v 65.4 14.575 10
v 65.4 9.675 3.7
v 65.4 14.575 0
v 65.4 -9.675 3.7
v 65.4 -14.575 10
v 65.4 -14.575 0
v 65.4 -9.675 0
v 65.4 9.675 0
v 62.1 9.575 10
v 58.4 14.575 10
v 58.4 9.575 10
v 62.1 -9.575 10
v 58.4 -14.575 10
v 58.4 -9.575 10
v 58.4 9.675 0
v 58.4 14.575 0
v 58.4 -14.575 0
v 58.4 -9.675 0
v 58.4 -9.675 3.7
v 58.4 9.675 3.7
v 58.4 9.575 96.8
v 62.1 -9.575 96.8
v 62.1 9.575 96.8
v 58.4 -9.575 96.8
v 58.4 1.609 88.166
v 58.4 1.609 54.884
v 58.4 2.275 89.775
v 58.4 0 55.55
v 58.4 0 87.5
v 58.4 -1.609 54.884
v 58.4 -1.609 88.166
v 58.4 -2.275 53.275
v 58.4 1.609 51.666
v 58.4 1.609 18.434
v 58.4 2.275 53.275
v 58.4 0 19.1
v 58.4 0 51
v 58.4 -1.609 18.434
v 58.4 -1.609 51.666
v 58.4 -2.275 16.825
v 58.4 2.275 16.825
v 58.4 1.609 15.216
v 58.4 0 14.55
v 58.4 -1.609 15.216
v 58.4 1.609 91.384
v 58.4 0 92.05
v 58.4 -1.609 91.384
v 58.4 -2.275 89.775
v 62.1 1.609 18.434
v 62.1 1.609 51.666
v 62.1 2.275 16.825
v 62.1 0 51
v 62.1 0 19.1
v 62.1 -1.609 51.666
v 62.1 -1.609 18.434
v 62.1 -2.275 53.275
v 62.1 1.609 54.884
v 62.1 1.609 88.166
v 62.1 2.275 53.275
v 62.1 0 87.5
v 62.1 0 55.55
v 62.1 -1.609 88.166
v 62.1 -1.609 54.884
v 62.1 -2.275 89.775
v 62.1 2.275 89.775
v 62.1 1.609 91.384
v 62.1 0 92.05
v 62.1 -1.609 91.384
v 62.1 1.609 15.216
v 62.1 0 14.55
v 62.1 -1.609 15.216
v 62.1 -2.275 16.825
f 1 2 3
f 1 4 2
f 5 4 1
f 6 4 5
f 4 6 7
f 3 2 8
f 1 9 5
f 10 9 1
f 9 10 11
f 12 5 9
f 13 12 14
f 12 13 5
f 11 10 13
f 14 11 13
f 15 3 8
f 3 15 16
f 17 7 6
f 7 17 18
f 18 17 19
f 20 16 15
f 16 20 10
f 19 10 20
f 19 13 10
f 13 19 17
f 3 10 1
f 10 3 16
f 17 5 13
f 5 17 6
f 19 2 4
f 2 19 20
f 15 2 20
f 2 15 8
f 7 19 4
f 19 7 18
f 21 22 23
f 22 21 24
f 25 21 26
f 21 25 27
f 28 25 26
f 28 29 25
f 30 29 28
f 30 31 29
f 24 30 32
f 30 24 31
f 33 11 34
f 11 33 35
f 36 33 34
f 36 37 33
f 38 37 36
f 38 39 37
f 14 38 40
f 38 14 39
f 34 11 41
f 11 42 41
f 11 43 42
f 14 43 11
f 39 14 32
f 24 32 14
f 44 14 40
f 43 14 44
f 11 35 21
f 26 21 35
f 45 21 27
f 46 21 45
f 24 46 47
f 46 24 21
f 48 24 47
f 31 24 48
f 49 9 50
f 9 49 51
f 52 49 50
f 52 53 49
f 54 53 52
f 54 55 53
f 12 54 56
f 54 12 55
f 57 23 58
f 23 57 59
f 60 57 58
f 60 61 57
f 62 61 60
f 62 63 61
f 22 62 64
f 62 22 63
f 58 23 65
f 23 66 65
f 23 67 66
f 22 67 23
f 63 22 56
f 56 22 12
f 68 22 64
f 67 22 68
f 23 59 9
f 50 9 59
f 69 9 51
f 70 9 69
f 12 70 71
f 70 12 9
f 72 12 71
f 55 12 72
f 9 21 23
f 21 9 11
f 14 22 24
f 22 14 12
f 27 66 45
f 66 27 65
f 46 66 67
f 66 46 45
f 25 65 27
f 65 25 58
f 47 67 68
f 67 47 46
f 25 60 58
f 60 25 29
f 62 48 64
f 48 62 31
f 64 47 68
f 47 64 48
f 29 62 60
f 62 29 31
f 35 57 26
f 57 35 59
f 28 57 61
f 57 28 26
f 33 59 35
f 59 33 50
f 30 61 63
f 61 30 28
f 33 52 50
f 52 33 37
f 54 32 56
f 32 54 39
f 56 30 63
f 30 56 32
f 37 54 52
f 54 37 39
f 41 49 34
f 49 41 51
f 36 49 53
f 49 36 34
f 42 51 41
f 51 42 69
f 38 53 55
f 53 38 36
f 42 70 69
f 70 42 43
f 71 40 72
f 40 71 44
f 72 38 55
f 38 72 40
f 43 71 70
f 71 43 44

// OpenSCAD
// file: libs/triangles.scad
module rightAngleTriangle(side1, side2, height=0) {
    points = [[0, 0], [0, side1], [side2, 0]];
    
    if (height > 0) {
        linear_extrude(height)
            polygon(points);
    } else {
        polygon(points);
    }
}

module rightAngleTriangleByHypotenuse(hypotenuse, height=0) {
    sideLength = hypotenuse/sqrt(2);
    points = [[0, 0], [0, sideLength], [sideLength, 0]];
    
    if (height > 0) {
        linear_extrude(height)
            polygon(points);
    } else {
        polygon(points);
    }
}

module equilateralTriangleCentered(sideLength, height=0) {
    translate([sideLength/2, 0])
        equilateralTriangle(sideLength, height);
}

module equilateralTriangle(sideLength, height=0) {
    if (height > 0) {
        cylinder(height, sideLength, sideLength, $fn=3);
    } else {
        circle(sideLength, $fn=3);
    }
}

module diamond(sideLength, height=0) {
    rhombus(sideLength, sideLength, height);
}

module rhombus(longside, shortside, height=0) {
    rhomboid(longside, shortside, 60, height);
}

module rhomboid(longside, shortside, angle, height=0, center=false) {
    centerx = center ? -(longside + shortside*cos(angle))/2 : 0;
    centery = center ? -(shortside * sin(angle))/2 : 0;
    echo(centerx);
    echo(centery);
    
    points = [[0, 0], [longside, 0], [longside + shortside*cos(angle), shortside*sin(angle)], [shortside*cos(angle), shortside*sin(angle)]];

    translate([centerx, centery]) {
        if (height > 0) {
            linear_extrude(height)
                polygon(points);
        } else {
            polygon(points);
        }
    }
}
// main file
include <libs/triangles.scad>;

$fa=1;

bracketDepth = 1.85*2;
bracketlength = 99.8;
bracketWidth = 19.15;

OD = 110;
ID = 103.2; //.5
pipeThickness = (OD-ID)/2;

holeDiam = 4.55;
holeChamfer = 7.45;

module bracketArm() {  
    //holes
    // 7.75
    // 44.25
    // 80.7
    difference() {
        cube([bracketlength, bracketWidth, bracketDepth]);
        translate([bracketlength -(7.75 + holeDiam/2), bracketWidth/2]) {
            cylinder(bracketDepth, holeDiam/2, holeDiam/2);
            translate([0, 0, bracketDepth/2])
                cylinder(bracketDepth/2, holeChamfer/2, holeChamfer/2);
        }
        
        translate([bracketlength -(44.25 + holeDiam/2), bracketWidth/2]) {
            cylinder(bracketDepth, holeDiam/2, holeDiam/2);
            translate([0, 0, bracketDepth/2])
                cylinder(bracketDepth/2, holeChamfer/2, holeChamfer/2);
        }
        
        translate([bracketlength -(80.7 + holeDiam/2), bracketWidth/2]) {
            cylinder(bracketDepth, holeDiam/2, holeDiam/2);
            translate([0, 0, bracketDepth/2])
                cylinder(bracketDepth/2, holeChamfer/2, holeChamfer/2);
        }
    }
}

module bracket() {
    bracketArm();
    translate([bracketDepth, 0])
        rotate([0, -90, 0])    
            bracketArm();
}

module pipe() {
    pipeLength = 1000;
    
    difference() {
        cylinder(pipeLength, OD/2, OD/2);
        cylinder(pipeLength, ID/2, ID/2);
    }
}

module innerRing() {
    printThickness = 4;
    difference() {
        cylinder(8, ID/2, ID/2-0.2);
        cylinder(8, ID/2-printThickness, ID/2-printThickness);
    }
    for (angle = [0:120:360]) {
        rotate([0, 0, angle])
            translate([ID/2 - pipeThickness-10, -bracketWidth/2-5]) {
                difference() {
                    union() {
                        cube([10, bracketWidth+10, 8]);
                    }
                    #rightAngleTriangle(8, 10, 12);
                    translate([0, bracketWidth+10, 8])
                        rotate([180, 0, 0])
                            rightAngleTriangle(8, 10, 8);
                    
                    
                }
            }
    }
    

}



/*for (angle = [0:120:360]) {
    rotate([0, 0, angle])
        translate([ID/2 - pipeThickness, -bracketWidth/2]) {
            bracket();
        }
}
translate([0, 0, 80.7+2.55])
    difference() {
        innerRing();
        
        for (angle = [0:120:360]) {
            rotate([0, 0, angle]) {
                translate([ID/2 - pipeThickness - 24, 0, 4]) {
                    rotate([0, 90, 0])
                        cylinder(32, 1.75, 1.75);
                }
                 translate([ID/2 - pipeThickness, -bracketWidth/2])
                    bracket();
            }
        }
    }*/
    
//pipe();
    
difference() {
    translate([OD/2 + pipeThickness, -bracketWidth/2]) {
        translate([bracketDepth, 0]) {
                    translate([-3.7, -5, 0]){
                        difference() {
                            cube([7, bracketWidth+10, 10]);
                            translate([0, 4.9, 0])
                            cube([bracketlength, bracketWidth+0.2, bracketDepth]);
                        }
                    }
            
                rotate([0, -90, 0]) {
                    
                    
                    difference() {
                        translate([7,0])
                            cube([bracketlength-10, bracketWidth, bracketDepth]);
                        translate([bracketlength -(7.75 + holeDiam/2), bracketWidth/2]) {
                            cylinder(bracketDepth, holeDiam/2, holeDiam/2);
                            /*translate([0, 0, bracketDepth/2])
                                cylinder(bracketDepth/2, holeChamfer/2, holeChamfer/2);*/
                        }
                        
                        translate([bracketlength -(44.25 + holeDiam/2), bracketWidth/2]) {
                            cylinder(bracketDepth, holeDiam/2, holeDiam/2);
                            /*translate([0, 0, bracketDepth/2])
                                cylinder(bracketDepth/2, holeChamfer/2, holeChamfer/2);*/
                        }
                        
                        translate([bracketlength -(80.7 + holeDiam/2), bracketWidth/2]) {
                            cylinder(bracketDepth, holeDiam/2, holeDiam/2);
                            /*translate([0, 0, bracketDepth/2])
                                cylinder(bracketDepth/2, holeChamfer/2, holeChamfer/2);*/
                        }
                    
                }
            }
        }
    }      
}
